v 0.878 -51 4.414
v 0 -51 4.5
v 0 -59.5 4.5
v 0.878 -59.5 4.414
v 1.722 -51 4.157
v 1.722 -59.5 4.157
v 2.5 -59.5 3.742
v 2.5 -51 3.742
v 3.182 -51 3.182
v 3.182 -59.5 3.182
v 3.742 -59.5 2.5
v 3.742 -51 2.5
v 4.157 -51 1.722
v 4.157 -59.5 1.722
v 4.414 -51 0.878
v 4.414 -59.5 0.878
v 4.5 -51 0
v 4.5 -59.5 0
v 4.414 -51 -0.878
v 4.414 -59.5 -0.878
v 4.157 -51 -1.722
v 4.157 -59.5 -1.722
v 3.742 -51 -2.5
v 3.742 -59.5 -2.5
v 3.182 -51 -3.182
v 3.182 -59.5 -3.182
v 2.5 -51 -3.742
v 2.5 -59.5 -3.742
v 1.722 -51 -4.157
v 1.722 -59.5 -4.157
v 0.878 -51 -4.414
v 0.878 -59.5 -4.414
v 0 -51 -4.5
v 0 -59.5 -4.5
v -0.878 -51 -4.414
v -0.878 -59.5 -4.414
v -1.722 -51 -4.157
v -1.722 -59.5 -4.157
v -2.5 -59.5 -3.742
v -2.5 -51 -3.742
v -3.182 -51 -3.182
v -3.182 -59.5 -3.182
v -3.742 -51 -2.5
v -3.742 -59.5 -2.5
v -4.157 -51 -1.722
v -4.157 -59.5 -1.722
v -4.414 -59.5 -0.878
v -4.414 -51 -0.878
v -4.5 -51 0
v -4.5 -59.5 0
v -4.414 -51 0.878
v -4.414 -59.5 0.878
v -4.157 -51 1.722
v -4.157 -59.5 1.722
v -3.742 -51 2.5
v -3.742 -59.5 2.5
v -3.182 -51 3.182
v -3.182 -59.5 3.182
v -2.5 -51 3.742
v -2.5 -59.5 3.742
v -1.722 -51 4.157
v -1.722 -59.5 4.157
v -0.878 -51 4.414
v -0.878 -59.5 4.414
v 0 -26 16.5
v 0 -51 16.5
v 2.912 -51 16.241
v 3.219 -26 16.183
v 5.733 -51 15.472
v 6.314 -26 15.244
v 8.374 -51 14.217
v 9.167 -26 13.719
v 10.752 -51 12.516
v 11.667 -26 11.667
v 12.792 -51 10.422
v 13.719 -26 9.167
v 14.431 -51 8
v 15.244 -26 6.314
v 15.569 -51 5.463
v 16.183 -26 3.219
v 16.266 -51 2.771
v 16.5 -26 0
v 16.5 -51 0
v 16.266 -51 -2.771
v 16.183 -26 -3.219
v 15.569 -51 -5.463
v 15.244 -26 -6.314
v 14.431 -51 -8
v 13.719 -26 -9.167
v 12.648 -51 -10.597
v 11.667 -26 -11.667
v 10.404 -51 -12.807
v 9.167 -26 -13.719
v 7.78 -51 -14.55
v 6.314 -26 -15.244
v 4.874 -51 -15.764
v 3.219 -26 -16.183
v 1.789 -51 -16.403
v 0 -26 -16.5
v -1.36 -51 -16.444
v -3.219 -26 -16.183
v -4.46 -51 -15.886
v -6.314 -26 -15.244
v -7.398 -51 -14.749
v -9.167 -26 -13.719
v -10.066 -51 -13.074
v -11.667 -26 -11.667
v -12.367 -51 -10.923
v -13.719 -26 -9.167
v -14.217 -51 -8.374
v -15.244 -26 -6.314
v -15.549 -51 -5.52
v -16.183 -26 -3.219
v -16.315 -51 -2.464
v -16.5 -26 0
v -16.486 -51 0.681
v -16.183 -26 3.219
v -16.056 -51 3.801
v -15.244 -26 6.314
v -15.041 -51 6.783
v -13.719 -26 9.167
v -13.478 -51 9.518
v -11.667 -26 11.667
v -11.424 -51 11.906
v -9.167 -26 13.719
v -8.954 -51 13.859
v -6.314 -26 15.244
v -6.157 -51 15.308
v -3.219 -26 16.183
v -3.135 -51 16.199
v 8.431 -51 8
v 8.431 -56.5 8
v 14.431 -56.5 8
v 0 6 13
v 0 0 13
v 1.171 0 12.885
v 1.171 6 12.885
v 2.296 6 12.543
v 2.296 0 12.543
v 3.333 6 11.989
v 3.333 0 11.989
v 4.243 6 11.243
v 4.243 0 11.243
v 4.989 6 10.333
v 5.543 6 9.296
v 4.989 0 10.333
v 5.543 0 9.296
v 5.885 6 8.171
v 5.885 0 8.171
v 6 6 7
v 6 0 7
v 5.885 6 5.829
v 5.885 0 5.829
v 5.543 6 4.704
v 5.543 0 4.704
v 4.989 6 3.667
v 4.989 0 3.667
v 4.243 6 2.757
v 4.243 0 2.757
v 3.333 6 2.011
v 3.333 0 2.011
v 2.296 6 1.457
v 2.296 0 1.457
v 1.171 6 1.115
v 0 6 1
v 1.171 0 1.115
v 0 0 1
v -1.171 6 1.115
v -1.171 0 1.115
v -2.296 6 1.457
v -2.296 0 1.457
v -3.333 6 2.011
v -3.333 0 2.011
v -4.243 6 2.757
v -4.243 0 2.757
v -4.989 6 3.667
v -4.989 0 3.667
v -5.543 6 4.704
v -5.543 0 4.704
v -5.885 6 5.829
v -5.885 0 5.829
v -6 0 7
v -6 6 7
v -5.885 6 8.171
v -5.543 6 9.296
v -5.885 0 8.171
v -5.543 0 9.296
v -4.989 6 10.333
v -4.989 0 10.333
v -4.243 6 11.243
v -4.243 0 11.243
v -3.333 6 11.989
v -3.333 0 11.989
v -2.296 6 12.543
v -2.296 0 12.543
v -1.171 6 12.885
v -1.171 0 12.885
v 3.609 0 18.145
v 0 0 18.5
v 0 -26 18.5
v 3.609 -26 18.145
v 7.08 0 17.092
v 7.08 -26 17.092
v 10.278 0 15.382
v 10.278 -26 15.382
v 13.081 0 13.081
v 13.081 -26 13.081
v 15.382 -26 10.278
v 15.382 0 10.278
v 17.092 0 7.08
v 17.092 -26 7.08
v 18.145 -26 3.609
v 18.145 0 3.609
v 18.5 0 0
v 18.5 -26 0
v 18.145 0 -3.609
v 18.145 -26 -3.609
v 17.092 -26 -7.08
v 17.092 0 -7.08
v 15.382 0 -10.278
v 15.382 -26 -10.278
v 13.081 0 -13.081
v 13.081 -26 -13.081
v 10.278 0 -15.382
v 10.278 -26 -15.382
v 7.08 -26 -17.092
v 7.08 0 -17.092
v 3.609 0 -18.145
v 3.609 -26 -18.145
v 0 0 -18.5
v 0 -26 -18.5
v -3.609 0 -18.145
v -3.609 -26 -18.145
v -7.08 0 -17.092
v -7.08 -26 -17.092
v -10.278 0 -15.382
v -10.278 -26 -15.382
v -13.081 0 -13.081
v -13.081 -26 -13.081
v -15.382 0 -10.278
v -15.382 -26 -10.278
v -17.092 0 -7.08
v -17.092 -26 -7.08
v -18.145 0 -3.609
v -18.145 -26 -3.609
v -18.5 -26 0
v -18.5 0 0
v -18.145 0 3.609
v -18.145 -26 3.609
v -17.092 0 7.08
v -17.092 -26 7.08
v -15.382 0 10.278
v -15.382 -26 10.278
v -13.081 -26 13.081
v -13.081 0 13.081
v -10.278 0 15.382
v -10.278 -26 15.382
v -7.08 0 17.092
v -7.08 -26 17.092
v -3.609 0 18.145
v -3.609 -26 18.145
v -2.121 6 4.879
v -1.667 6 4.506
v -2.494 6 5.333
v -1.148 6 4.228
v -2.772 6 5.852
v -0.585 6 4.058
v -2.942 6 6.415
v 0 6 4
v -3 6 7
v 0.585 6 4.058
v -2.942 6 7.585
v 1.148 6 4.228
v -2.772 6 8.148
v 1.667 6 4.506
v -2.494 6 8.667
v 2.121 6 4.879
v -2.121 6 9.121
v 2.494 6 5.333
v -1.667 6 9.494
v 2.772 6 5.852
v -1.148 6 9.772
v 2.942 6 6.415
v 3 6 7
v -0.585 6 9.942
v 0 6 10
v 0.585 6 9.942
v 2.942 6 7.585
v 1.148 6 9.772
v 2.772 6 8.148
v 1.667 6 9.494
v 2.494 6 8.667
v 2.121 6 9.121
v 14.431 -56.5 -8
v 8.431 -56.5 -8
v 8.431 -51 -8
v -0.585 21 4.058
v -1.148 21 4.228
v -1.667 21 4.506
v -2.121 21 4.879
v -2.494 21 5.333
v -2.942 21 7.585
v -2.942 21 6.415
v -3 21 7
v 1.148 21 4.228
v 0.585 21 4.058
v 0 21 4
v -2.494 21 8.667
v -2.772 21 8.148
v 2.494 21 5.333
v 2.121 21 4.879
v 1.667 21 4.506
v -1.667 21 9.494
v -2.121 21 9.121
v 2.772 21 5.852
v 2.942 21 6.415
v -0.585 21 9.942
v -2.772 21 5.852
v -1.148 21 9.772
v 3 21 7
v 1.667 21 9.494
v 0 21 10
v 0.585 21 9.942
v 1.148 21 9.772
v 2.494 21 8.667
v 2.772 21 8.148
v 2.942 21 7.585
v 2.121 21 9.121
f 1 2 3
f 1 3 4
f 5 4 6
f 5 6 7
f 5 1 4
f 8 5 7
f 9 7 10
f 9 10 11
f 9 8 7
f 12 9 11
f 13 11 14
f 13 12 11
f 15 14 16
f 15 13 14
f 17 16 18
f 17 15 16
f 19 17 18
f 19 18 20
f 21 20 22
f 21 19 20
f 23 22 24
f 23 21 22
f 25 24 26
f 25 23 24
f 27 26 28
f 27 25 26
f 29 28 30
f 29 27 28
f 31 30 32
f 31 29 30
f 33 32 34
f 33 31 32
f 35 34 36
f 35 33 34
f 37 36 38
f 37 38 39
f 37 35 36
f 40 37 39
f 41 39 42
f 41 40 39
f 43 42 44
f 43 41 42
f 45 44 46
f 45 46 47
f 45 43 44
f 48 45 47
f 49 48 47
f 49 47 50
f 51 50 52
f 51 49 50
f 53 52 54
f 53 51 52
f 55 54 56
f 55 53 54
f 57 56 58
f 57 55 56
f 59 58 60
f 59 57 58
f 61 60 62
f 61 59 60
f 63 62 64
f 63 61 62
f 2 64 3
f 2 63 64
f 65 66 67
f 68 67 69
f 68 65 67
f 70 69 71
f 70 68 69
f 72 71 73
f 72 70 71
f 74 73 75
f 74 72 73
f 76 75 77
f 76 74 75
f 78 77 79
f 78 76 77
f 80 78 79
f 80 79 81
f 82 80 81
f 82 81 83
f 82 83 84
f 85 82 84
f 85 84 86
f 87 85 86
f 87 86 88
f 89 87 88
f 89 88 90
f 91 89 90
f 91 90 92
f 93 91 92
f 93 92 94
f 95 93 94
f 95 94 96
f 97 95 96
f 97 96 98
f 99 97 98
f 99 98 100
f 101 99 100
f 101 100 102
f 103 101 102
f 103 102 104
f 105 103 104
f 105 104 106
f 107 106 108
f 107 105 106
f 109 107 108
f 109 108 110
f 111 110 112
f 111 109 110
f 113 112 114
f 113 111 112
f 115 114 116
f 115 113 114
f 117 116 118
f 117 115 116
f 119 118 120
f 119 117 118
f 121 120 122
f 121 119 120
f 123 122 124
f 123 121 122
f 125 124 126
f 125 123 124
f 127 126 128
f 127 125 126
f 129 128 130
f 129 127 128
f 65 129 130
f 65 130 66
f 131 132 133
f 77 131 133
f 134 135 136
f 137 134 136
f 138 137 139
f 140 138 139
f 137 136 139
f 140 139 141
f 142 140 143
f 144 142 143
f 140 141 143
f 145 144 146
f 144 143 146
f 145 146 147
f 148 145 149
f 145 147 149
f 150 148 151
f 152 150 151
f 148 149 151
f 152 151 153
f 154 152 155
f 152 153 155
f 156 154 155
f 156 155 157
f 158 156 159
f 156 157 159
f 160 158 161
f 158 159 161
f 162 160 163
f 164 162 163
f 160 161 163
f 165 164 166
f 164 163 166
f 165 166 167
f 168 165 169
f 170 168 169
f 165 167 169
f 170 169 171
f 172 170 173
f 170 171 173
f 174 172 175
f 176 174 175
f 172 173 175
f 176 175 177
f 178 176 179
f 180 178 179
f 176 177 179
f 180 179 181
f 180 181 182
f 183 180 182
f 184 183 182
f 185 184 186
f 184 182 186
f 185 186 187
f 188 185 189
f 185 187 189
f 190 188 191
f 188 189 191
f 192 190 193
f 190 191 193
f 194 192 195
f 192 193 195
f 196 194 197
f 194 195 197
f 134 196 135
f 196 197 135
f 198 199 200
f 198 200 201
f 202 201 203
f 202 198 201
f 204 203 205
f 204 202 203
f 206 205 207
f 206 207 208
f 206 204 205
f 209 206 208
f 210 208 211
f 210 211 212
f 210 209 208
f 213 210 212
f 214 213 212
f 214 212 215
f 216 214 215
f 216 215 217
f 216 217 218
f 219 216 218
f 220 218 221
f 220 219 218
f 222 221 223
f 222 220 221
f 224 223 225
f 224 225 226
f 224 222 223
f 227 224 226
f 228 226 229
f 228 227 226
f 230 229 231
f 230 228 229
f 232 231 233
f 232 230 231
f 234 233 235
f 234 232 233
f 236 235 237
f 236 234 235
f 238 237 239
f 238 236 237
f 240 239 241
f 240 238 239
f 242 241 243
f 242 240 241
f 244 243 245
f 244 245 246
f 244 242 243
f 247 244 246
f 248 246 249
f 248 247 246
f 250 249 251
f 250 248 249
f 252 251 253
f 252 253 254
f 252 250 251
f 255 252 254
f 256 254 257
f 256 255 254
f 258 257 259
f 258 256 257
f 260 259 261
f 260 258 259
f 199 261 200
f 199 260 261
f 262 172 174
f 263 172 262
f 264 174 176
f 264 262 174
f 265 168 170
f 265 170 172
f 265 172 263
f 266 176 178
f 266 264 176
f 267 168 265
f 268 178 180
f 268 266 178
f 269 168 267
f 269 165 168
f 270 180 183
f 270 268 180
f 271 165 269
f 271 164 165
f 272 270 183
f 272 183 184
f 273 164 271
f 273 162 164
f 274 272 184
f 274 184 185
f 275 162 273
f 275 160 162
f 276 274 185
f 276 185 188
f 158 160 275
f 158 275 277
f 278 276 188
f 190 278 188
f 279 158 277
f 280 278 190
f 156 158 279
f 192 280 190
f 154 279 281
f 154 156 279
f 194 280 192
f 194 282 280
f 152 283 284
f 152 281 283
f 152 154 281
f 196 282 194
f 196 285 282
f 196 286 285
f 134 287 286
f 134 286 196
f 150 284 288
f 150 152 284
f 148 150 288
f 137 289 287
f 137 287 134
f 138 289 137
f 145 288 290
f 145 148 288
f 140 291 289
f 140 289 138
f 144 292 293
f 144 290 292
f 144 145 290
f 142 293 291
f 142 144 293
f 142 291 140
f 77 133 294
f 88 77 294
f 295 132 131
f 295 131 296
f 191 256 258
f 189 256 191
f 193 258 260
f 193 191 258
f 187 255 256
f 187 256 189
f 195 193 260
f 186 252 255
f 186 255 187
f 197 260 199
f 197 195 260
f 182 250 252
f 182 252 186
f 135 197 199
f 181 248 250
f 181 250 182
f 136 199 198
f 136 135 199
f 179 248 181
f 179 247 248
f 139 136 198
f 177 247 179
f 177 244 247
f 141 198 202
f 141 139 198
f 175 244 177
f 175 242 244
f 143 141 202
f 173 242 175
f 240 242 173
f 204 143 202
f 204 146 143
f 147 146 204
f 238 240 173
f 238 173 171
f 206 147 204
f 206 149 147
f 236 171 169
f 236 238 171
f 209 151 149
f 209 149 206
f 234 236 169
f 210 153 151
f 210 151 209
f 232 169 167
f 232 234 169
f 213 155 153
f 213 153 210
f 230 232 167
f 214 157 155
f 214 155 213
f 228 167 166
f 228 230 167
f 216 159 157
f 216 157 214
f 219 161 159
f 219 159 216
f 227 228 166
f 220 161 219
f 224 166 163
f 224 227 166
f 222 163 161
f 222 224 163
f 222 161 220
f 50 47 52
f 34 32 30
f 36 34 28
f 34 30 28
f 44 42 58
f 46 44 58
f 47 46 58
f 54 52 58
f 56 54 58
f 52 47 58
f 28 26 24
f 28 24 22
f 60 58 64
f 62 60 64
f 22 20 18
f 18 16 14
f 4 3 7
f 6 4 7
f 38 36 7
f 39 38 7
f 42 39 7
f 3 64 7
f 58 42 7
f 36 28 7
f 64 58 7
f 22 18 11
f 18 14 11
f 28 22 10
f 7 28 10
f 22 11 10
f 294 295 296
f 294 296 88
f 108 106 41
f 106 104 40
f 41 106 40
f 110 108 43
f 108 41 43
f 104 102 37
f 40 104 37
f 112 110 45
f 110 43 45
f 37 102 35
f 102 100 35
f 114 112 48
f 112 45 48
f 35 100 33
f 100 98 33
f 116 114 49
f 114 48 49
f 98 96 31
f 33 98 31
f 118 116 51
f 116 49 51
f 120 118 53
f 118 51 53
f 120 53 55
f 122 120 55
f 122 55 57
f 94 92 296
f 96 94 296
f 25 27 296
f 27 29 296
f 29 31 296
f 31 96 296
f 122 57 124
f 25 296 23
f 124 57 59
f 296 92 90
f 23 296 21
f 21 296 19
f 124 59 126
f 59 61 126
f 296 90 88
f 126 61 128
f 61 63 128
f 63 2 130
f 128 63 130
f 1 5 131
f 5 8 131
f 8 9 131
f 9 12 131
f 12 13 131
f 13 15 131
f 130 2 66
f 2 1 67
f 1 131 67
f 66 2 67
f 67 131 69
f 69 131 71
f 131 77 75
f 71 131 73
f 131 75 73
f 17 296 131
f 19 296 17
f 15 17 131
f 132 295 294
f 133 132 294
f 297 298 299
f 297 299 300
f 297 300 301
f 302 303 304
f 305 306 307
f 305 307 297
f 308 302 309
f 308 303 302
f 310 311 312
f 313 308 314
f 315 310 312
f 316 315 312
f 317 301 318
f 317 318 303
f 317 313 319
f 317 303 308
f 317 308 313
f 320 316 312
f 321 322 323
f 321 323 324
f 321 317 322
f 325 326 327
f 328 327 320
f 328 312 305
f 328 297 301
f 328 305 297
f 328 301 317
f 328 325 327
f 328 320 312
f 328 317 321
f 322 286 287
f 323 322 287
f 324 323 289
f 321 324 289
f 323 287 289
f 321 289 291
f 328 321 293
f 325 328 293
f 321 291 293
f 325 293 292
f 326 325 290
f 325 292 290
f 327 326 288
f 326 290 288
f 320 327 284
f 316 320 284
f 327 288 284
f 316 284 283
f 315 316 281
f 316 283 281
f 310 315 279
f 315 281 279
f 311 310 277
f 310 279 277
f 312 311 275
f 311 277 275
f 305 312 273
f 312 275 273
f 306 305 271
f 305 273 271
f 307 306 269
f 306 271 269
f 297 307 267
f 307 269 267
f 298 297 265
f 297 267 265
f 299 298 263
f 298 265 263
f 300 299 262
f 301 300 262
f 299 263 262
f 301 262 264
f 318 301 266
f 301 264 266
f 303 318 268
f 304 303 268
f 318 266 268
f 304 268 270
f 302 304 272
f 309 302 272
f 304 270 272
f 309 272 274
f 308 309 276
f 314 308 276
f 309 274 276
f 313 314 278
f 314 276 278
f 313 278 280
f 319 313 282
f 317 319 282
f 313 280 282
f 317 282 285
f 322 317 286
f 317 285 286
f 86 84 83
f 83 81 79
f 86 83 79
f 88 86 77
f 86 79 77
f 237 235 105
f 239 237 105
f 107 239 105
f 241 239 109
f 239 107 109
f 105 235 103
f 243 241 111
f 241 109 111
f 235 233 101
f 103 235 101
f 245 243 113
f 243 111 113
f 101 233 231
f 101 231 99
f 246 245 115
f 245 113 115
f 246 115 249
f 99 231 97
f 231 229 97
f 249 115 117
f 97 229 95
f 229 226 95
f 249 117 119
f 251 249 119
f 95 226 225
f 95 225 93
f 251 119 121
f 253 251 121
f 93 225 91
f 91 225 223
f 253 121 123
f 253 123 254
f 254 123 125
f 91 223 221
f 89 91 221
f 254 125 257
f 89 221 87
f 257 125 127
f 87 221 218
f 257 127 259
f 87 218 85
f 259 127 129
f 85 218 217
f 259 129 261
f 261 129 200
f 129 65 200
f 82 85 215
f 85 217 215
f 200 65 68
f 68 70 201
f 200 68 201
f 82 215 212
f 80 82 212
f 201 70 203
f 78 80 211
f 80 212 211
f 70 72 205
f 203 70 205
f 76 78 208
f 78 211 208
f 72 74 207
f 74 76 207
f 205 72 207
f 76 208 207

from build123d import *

# Parameters (mm, degrees)
SKETCH1_R           = 18.5
SKETCH1_R_2         = 16.5
SKETCH1_R_3         = 6
SKETCH1_R_4         = 4.5
SKETCH1_W           = 6
SKETCH1_H           = 16
SKETCH1_R_5         = 3
BOSS_EXTRUDE1_DEPTH = 26
BOSS_EXTRUDE2_START = -26
SKETCH1_3_R         = 16.5
BOSS_EXTRUDE2_DEPTH = 25
BOSS_EXTRUDE3_START = -56.5
SKETCH1_4_W         = 6
SKETCH1_4_H         = 16
BOSS_EXTRUDE3_DEPTH = 5.5
BOSS_EXTRUDE4_START = -51
SKETCH1_5_R         = 4.5
BOSS_EXTRUDE4_DEPTH = 8.5
SKETCH1_6_R         = 6
BOSS_EXTRUDE5_DEPTH = 6
BOSS_EXTRUDE6_START = 6
SKETCH1_7_R         = 3
BOSS_EXTRUDE6_DEPTH = 15


with BuildPart() as part:
    # Sketch1 → Boss-Extrude1 (new body)
    # profile 1 of 14: a face of its own
    with BuildSketch(Plane(origin=(0, 0, 0), x_dir=(1, 0, 0), z_dir=(0, 1, 0))):
        with Locations(Location((0, 0, 0), (0, 0, 270))):
            Circle(SKETCH1_R)
        Circle(SKETCH1_R_2, mode=Mode.SUBTRACT)
    # profile 2 of 14: a face of its own
    with BuildSketch(Plane(origin=(0, 0, 0), x_dir=(1, 0, 0), z_dir=(0, 1, 0))):
        with BuildLine():
            Line((14.43086969, -8), (8.43086969, -8))
            Line((8.43086969, -8), (8.43086969, 8))
            Line((8.43086969, 8), (14.43086969, 8))
            ThreePointArc((14.43086969, 8), (-16.5, 0), (14.43086969, -8))
        make_face()
        with BuildLine():
            ThreePointArc((3.822221213, -2.375), (5.428320517, -4.443960806), (6, -7))
            ThreePointArc((6, -7), (-2.556039194, -12.428320517), (-3.822221213, -2.375))
            ThreePointArc((-3.822221213, -2.375), (-1.234909823, 4.327239042), (4.5, 0))
            ThreePointArc((4.5, 0), (4.327239042, -1.234909823), (3.822221213, -2.375))
        make_face(mode=Mode.SUBTRACT)
    # profile 3 of 14: a face of its own
    with BuildSketch(Plane(origin=(0, 0, 0), x_dir=(1, 0, 0), z_dir=(0, 1, 0))):
        with Locations((0, -7)):
            Circle(SKETCH1_R_3)
    # profile 4 of 14: a face of its own
    with BuildSketch(Plane(origin=(0, 0, 0), x_dir=(1, 0, 0), z_dir=(0, 1, 0))):
        Circle(SKETCH1_R_4)
    # profile 5 of 14: a face of its own
    with BuildSketch(Plane(origin=(0, 0, 0), x_dir=(1, 0, 0), z_dir=(0, 1, 0))):
        with Locations((11.43086969, 0)):
            Rectangle(SKETCH1_W, SKETCH1_H)
    # profile 6 of 14: a face of its own
    with BuildSketch(Plane(origin=(0, 0, 0), x_dir=(1, 0, 0), z_dir=(0, 1, 0))):
        with BuildLine():
            Line((14.43086969, 8), (14.43086969, -8))
            ThreePointArc((14.43086969, -8), (15.974344273, -4.13162499), (16.5, 0))
            ThreePointArc((16.5, 0), (15.974344273, 4.13162499), (14.43086969, 8))
        make_face()
    # profile 7 of 14: a face of its own
    with BuildSketch(Plane(origin=(0, 0, 0), x_dir=(1, 0, 0), z_dir=(0, 1, 0))):
        Circle(SKETCH1_R_4)
    # profile 8 of 14: a face of its own
    with BuildSketch(Plane(origin=(0, 0, 0), x_dir=(1, 0, 0), z_dir=(0, 1, 0))):
        with Locations((0, -7)):
            Circle(SKETCH1_R_3)
        with Locations((0, -7)):
            Circle(SKETCH1_R_5, mode=Mode.SUBTRACT)
    # profile 9 of 14: a face of its own
    with BuildSketch(Plane(origin=(0, 0, 0), x_dir=(1, 0, 0), z_dir=(0, 1, 0))):
        Circle(SKETCH1_R_4)
    # profile 10 of 14: a face of its own
    with BuildSketch(Plane(origin=(0, 0, 0), x_dir=(1, 0, 0), z_dir=(0, 1, 0))):
        Circle(SKETCH1_R_4)
    # profile 11 of 14: a face of its own
    with BuildSketch(Plane(origin=(0, 0, 0), x_dir=(1, 0, 0), z_dir=(0, 1, 0))):
        with Locations((0, -7)):
            Circle(SKETCH1_R_3)
        with Locations((0, -7)):
            Circle(SKETCH1_R_5, mode=Mode.SUBTRACT)
    # profile 12 of 14: a face of its own
    with BuildSketch(Plane(origin=(0, 0, 0), x_dir=(1, 0, 0), z_dir=(0, 1, 0))):
        with Locations((0, -7)):
            Circle(SKETCH1_R_5)
    # profile 13 of 14: a face of its own
    with BuildSketch(Plane(origin=(0, 0, 0), x_dir=(1, 0, 0), z_dir=(0, 1, 0))):
        with Locations((0, -7)):
            Circle(SKETCH1_R_5)
    # profile 14 of 14: a face of its own
    with BuildSketch(Plane(origin=(0, 0, 0), x_dir=(1, 0, 0), z_dir=(0, 1, 0))):
        Circle(SKETCH1_R_4)
    extrude(amount=-BOSS_EXTRUDE1_DEPTH)

    # Sketch1<3> → Boss-Extrude2 (add)
    with BuildSketch(Plane(origin=(0, 0, 0), x_dir=(1, 0, 0), z_dir=(0, 1, 0)).offset(BOSS_EXTRUDE2_START)):
        with Locations(Location((0, 0, 0), (0, 0, 270))):
            Circle(SKETCH1_3_R)
    extrude(amount=-BOSS_EXTRUDE2_DEPTH)

    # Sketch1<4> → Boss-Extrude3 (add)
    with BuildSketch(Plane(origin=(0, 0, 0), x_dir=(1, 0, 0), z_dir=(0, 1, 0)).offset(BOSS_EXTRUDE3_START)):
        with Locations((11.43086969, 0)):
            Rectangle(SKETCH1_4_W, SKETCH1_4_H)
    extrude(amount=BOSS_EXTRUDE3_DEPTH)

    # Sketch1<5> → Boss-Extrude4 (add)
    with BuildSketch(Plane(origin=(0, 0, 0), x_dir=(1, 0, 0), z_dir=(0, 1, 0)).offset(BOSS_EXTRUDE4_START)):
        with Locations(Location((0, 0, 0), (0, 0, 270))):
            Circle(SKETCH1_5_R)
    extrude(amount=-BOSS_EXTRUDE4_DEPTH)

    # Sketch1<6> → Boss-Extrude5 (add)
    with BuildSketch(Plane(origin=(0, 0, 0), x_dir=(1, 0, 0), z_dir=(0, 1, 0))):
        with Locations(Location((0, -7, 0), (0, 0, 270))):
            Circle(SKETCH1_6_R)
    extrude(amount=BOSS_EXTRUDE5_DEPTH)

    # Sketch1<7> → Boss-Extrude6 (add)
    with BuildSketch(Plane(origin=(0, 0, 0), x_dir=(1, 0, 0), z_dir=(0, 1, 0)).offset(BOSS_EXTRUDE6_START)):
        with Locations(Location((0, -7, 0), (0, 0, 270))):
            Circle(SKETCH1_7_R)
    extrude(amount=BOSS_EXTRUDE6_DEPTH)


solid = part.part
